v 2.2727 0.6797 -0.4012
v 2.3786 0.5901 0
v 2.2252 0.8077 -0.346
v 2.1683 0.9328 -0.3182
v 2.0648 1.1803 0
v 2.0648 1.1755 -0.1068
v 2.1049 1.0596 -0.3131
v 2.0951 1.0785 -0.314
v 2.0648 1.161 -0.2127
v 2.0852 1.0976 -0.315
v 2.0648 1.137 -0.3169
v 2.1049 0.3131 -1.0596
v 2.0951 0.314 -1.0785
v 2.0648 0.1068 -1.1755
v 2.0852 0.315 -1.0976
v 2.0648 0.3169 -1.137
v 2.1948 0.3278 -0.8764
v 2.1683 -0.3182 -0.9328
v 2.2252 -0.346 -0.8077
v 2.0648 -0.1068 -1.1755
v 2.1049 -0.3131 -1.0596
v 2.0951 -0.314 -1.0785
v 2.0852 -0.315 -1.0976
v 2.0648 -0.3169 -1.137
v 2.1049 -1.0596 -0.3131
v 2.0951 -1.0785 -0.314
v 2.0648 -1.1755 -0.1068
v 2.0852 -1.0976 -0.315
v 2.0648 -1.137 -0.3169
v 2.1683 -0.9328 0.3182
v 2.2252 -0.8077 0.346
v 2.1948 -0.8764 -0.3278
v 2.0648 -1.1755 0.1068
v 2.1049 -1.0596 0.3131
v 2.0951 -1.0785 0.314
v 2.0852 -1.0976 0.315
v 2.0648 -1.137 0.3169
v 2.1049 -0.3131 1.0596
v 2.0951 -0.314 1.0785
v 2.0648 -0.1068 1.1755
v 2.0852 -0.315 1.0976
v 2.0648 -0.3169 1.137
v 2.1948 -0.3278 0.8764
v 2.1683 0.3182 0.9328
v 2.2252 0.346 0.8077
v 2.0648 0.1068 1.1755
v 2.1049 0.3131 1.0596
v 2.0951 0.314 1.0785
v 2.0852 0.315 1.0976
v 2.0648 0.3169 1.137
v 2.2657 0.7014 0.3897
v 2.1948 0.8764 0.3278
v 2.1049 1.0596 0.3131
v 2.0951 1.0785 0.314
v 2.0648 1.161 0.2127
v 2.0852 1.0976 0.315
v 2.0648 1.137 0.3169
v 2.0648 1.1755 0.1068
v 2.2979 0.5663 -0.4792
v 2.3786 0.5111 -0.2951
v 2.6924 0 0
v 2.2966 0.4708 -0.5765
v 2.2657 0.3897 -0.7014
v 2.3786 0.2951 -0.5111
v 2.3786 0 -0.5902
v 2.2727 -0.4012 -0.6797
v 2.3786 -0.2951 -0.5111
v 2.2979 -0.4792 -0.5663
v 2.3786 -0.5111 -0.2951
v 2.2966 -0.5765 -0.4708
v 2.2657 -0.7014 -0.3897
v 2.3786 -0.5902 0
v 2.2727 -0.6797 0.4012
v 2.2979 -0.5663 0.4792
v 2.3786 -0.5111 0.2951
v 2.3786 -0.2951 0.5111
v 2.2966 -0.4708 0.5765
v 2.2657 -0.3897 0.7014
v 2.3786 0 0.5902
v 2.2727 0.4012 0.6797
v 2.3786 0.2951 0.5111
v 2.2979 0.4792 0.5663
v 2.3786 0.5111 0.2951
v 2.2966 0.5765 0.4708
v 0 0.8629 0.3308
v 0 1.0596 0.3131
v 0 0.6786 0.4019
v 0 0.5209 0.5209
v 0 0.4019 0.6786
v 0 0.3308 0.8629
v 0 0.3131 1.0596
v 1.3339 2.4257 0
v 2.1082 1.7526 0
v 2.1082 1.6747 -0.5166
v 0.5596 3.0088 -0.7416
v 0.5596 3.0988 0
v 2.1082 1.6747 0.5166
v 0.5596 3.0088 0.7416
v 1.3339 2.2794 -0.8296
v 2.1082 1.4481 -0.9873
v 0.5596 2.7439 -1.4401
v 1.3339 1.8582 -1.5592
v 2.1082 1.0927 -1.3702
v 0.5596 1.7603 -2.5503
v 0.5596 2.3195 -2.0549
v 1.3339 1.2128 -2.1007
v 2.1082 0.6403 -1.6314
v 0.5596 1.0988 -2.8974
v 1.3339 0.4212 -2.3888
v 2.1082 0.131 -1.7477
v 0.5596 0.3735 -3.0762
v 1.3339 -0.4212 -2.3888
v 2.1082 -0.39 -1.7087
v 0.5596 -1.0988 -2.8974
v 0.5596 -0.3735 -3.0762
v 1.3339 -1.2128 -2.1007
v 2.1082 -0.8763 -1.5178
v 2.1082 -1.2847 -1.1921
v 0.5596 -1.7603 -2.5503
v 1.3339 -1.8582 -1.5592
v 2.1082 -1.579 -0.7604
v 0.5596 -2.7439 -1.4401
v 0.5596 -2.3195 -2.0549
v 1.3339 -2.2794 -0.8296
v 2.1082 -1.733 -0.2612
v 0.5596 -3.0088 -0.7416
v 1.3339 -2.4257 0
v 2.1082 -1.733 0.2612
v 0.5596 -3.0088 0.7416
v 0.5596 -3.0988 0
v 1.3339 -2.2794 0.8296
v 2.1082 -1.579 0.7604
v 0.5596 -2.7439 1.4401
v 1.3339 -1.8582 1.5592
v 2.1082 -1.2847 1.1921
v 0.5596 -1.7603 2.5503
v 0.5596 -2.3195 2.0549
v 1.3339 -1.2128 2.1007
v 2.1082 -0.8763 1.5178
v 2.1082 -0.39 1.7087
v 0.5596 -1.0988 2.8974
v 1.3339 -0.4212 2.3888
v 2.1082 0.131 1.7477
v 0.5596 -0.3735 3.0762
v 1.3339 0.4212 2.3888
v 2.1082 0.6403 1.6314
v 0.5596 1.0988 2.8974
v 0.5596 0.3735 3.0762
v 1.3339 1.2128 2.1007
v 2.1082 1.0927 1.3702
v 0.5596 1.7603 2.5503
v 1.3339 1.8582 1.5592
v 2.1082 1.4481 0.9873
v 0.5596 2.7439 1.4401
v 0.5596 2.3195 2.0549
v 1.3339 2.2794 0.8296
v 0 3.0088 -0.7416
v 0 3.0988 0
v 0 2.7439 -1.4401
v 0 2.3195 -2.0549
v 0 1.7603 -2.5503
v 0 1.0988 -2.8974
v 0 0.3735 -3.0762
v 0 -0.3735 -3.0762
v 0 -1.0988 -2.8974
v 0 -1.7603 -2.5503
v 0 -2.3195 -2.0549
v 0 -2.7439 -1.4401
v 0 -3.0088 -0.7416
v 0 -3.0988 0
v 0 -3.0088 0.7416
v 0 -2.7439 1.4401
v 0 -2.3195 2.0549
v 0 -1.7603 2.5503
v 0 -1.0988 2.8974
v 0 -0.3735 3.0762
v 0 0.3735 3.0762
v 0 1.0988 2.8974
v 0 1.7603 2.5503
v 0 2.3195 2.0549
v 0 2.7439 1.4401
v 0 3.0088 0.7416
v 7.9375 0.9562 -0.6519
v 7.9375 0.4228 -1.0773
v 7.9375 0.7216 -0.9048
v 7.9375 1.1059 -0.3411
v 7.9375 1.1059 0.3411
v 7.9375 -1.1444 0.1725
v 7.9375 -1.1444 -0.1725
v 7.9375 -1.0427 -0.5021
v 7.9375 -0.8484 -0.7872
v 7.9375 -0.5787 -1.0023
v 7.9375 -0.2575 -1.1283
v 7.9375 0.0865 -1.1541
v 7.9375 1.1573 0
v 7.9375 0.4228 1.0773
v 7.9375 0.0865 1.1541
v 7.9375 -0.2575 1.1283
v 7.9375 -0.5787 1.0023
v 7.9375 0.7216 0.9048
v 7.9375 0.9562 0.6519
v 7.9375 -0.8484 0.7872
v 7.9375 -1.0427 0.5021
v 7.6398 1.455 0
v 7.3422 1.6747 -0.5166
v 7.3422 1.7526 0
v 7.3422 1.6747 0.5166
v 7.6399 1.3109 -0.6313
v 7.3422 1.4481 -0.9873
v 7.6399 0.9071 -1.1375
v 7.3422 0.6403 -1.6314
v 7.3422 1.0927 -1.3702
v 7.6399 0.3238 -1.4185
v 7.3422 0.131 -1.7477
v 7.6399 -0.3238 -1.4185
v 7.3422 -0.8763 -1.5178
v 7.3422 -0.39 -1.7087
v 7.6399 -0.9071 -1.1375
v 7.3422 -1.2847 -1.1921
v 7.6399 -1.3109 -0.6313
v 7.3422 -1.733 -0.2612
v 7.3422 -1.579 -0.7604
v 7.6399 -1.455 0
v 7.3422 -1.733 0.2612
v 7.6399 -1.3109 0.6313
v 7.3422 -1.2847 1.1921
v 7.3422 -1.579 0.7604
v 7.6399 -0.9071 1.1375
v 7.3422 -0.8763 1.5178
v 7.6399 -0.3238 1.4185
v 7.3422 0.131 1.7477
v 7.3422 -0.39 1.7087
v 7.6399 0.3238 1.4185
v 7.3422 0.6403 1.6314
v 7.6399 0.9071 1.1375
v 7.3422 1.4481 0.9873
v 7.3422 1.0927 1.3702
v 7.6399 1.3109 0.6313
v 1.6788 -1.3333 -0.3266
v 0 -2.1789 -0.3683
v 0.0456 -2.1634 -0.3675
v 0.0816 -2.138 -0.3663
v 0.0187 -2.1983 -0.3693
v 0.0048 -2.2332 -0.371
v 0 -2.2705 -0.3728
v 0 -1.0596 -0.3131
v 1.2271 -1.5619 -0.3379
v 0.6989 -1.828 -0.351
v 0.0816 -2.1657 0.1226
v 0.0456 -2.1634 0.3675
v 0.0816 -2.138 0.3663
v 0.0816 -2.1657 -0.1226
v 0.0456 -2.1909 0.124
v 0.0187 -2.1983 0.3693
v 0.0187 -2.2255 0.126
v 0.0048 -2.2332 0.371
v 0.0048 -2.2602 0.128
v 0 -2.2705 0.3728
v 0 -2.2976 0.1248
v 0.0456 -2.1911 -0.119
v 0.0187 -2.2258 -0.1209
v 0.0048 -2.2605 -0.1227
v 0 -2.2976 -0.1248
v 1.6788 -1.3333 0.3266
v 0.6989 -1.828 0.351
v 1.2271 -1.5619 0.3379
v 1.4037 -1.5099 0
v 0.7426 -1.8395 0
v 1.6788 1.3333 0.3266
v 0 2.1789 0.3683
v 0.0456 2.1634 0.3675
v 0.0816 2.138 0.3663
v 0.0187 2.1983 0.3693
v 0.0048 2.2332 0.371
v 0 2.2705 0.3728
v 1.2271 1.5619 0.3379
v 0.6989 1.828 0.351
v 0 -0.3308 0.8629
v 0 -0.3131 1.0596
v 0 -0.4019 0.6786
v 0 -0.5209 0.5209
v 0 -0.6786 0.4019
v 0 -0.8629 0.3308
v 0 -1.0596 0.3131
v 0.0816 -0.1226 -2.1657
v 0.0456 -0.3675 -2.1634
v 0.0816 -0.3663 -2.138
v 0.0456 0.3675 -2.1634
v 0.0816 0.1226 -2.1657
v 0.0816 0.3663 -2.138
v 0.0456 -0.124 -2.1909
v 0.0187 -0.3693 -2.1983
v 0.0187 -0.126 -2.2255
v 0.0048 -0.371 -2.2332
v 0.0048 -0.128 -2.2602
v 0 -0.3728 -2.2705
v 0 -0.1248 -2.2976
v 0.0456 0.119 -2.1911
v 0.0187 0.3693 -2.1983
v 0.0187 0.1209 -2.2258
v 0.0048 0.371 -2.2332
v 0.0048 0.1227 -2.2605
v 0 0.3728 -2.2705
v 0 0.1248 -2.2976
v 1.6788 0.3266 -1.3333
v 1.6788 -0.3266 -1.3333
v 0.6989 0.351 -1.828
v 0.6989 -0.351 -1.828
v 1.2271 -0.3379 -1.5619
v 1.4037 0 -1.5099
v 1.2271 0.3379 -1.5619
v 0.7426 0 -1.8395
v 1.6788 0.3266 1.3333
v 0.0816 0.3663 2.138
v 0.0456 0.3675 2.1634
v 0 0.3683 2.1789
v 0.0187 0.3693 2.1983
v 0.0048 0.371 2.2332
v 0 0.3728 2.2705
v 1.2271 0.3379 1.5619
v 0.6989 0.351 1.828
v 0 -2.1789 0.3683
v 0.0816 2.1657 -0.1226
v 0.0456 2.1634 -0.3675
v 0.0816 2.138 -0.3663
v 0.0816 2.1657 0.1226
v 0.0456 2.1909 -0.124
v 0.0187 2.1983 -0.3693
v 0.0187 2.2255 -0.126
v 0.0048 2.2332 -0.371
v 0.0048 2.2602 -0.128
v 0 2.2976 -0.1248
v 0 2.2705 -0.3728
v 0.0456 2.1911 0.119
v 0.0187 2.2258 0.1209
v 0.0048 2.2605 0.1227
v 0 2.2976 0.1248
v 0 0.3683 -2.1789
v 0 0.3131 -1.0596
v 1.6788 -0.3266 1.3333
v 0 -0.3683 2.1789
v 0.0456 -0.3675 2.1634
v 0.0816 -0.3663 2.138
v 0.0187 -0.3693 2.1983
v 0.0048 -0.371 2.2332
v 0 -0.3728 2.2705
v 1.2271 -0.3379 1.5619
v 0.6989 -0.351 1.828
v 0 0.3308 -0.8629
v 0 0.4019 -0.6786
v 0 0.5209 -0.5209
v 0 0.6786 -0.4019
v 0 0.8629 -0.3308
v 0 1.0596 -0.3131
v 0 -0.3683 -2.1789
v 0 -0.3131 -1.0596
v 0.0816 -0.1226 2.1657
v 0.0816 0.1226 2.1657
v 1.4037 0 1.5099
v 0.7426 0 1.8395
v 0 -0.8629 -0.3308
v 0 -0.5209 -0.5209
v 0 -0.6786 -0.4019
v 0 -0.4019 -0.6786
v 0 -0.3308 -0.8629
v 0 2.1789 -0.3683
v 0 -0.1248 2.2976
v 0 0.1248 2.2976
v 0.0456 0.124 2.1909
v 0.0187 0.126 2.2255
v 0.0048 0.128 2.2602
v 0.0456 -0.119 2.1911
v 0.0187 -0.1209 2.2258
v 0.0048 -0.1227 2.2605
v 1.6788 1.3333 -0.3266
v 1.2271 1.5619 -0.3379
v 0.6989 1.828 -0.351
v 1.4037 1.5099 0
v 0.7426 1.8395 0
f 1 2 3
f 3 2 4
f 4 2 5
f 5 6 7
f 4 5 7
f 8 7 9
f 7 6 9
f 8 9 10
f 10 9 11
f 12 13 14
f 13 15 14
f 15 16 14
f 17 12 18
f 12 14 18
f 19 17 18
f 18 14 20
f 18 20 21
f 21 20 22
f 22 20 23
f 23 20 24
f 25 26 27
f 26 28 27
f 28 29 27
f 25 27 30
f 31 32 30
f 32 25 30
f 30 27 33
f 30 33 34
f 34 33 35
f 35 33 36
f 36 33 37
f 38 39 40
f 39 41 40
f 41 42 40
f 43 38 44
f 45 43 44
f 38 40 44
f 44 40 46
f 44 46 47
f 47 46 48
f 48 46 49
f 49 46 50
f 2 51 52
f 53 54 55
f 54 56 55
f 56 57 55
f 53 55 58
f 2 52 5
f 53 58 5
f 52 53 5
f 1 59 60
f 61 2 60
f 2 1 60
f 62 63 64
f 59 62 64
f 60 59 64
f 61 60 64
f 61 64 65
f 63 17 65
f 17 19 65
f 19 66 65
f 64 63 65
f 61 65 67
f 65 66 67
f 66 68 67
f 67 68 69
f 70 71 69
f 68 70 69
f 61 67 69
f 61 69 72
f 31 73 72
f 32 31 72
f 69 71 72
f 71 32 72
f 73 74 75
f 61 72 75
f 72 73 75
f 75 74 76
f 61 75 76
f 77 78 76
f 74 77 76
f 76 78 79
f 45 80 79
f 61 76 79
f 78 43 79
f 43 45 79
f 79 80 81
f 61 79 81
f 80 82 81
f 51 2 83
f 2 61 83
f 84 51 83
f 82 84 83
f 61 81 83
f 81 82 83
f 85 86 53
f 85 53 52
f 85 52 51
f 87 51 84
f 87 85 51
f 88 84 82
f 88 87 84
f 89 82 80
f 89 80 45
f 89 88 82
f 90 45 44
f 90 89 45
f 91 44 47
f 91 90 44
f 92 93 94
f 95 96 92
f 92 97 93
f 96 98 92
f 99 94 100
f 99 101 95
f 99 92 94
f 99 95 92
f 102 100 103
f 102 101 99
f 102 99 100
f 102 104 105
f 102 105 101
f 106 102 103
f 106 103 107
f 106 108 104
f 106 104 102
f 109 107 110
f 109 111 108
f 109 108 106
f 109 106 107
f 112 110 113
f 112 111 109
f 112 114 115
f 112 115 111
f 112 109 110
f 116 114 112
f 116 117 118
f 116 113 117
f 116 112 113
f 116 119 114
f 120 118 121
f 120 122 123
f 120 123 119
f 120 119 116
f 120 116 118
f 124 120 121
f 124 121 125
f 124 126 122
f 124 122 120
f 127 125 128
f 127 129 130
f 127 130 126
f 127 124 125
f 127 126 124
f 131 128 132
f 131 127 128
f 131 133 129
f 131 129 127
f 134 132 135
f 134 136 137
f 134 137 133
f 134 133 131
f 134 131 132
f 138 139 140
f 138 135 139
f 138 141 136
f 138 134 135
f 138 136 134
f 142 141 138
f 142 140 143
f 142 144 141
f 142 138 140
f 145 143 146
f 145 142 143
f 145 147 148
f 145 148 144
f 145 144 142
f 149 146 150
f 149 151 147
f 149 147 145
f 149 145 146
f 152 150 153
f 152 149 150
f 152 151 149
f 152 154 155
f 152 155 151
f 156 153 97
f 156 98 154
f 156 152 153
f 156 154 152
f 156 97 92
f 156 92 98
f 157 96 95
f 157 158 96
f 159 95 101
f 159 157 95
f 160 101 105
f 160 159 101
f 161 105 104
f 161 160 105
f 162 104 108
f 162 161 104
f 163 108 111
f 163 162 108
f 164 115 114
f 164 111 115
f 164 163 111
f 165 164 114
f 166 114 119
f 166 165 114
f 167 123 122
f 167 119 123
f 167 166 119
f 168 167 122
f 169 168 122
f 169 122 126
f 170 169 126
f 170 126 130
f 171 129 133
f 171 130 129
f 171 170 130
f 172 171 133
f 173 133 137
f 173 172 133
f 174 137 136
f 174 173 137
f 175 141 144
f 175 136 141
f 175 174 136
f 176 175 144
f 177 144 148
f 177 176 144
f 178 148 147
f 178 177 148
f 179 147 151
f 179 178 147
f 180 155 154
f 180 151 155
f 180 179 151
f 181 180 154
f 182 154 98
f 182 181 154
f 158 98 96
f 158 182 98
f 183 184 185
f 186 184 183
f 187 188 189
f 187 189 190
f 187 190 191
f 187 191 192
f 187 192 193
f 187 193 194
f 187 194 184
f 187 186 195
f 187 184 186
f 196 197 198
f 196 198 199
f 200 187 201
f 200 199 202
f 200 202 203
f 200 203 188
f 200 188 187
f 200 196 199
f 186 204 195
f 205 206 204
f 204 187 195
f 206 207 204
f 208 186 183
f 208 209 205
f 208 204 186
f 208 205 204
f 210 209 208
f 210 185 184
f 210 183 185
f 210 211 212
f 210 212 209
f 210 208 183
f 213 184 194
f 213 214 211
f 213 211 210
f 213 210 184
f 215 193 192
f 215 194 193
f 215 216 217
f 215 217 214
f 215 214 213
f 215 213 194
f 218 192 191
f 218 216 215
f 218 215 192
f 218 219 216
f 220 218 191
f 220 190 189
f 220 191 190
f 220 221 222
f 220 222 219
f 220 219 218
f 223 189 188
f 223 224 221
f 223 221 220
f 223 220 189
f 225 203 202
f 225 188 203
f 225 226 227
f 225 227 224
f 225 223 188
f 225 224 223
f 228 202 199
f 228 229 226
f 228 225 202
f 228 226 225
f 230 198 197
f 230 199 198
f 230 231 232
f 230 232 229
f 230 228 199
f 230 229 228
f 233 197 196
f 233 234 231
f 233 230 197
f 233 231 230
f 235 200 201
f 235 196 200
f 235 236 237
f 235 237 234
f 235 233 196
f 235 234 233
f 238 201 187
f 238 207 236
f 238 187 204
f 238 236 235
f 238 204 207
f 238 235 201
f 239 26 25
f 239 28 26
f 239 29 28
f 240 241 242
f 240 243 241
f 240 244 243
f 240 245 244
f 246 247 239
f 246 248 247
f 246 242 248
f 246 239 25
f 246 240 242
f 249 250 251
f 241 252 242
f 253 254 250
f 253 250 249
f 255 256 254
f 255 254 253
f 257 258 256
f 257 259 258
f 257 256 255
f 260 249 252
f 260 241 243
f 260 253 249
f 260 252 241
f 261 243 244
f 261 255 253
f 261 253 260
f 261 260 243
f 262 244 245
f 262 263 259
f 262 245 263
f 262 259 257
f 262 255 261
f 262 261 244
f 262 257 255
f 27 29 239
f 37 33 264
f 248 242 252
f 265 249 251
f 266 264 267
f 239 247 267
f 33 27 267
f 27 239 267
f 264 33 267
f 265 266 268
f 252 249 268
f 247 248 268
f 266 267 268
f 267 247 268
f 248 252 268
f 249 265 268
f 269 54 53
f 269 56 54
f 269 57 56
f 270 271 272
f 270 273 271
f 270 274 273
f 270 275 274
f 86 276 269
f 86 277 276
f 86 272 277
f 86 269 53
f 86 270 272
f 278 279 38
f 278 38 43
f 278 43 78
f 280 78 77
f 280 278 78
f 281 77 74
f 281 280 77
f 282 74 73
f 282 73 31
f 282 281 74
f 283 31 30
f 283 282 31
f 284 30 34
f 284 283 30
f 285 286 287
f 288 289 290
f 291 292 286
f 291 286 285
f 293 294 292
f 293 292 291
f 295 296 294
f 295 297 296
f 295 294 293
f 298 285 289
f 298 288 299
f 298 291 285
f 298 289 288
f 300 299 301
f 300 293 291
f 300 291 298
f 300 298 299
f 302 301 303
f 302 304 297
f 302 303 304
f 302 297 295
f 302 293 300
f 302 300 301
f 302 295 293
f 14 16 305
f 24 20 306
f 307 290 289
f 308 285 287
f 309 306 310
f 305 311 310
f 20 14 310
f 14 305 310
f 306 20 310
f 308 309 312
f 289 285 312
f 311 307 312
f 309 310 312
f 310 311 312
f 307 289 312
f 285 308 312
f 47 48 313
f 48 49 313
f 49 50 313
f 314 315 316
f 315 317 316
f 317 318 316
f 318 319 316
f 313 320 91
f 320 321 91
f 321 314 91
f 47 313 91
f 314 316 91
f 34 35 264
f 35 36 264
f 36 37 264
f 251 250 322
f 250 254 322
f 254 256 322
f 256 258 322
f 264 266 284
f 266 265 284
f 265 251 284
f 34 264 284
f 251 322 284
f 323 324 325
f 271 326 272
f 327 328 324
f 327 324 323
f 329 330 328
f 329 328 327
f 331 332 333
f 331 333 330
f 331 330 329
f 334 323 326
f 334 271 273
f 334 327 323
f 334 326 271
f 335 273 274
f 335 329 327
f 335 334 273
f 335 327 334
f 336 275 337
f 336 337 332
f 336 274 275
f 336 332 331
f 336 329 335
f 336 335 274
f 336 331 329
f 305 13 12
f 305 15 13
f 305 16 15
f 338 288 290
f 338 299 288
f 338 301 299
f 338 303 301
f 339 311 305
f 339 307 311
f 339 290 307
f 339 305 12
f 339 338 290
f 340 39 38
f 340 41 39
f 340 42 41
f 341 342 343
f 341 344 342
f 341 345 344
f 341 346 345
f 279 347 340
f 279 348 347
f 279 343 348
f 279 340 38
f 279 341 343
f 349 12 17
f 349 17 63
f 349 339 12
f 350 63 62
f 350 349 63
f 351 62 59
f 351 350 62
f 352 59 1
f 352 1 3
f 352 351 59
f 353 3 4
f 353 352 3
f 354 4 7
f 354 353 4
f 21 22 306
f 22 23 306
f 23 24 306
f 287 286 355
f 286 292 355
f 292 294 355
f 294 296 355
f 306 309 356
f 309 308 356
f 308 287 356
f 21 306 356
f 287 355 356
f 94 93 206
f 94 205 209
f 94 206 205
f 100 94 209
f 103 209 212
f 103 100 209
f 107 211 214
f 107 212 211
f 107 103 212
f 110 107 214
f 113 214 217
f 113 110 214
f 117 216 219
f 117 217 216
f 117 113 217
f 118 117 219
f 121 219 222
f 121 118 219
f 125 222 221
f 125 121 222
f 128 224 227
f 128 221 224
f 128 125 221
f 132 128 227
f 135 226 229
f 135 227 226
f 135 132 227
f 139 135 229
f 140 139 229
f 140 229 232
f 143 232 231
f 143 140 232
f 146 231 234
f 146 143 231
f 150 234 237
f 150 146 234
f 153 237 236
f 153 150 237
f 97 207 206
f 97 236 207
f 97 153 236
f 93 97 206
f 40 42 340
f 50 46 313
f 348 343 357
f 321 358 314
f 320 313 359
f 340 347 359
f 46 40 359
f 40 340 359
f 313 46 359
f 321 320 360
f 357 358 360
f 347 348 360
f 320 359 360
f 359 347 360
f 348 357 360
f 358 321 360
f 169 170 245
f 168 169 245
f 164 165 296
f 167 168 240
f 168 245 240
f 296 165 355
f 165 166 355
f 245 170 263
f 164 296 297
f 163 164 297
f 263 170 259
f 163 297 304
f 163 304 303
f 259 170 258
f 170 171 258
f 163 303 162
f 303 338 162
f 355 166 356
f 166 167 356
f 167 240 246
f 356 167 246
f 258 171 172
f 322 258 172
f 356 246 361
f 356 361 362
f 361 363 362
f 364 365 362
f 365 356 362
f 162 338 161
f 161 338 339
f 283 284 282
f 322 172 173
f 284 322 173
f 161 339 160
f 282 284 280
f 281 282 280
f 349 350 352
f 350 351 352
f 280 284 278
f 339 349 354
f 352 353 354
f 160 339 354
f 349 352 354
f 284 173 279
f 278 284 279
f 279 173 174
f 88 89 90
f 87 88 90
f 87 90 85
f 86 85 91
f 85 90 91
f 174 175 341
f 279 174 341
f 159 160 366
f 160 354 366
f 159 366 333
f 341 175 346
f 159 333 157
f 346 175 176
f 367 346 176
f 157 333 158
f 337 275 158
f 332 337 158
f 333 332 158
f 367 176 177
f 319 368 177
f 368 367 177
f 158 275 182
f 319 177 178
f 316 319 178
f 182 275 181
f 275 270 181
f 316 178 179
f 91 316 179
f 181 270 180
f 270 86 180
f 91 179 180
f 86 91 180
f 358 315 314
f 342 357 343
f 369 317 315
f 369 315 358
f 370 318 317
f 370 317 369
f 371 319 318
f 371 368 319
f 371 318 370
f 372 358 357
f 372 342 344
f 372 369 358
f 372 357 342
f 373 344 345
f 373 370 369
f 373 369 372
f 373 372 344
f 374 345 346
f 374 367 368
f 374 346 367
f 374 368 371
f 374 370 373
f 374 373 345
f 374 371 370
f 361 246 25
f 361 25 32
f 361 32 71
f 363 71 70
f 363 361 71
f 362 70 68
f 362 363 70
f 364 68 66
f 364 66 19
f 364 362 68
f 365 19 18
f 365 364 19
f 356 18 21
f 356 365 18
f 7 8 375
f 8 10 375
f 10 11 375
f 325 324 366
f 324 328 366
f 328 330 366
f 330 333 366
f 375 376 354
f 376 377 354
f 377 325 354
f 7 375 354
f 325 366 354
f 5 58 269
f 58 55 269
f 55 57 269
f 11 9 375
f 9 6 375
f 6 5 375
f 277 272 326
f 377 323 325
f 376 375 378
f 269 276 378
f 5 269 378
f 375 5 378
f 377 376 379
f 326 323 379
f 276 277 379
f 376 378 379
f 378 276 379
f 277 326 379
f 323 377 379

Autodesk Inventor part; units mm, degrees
ref_plane "YZ Plane" through (0, 0, 0) normal (1, 0, 0) x (0, 1, 0)
ref_plane "XZ Plane" through (0, 0, 0) normal (0, 1, 0) x (-1, 0, 0)
sketch "Sketch1" plane through (0, 0, 0) normal (0, 0, 1) x (1, 0, 0)
  line L0 (2.6924, 0) -> (7.9375, 0)
  line L1 (7.9375, 0) -> (7.9375, 1.7526)
  line L2 (7.9375, 1.7526) -> (2.1082, 1.7526)
  line L3 (0.5596, 3.0988) -> (0, 3.0988)
  line L4 (-1.5875, 0) -> (9.525, 0) projected
  line L5 (0, -0.6198) -> (0, 3.7186) projected
  line L6 (0, 2.2098) -> (2.0648, 1.1803)
  line L7 (2.0648, 1.1803) -> (2.6924, 0)
  line L8 (2.1082, 1.7526) -> (0.5596, 3.0988)
  line L9 (0, 3.0988) -> (0, 2.2098)
  dimension "d2" = 3.5052
  dimension "d3" = 6.1976
  dimension "d4" = 2.6924
  dimension "d5" = 4.4196
  dimension "d6" = 26.5
  dimension "d7" = 62
  dimension "d13" = 41
  dimension "d14" = 2.1082
  dimension "d15" = 7.9375
revolve "Body" add sketch "Sketch1" angle 360 about axis through (2.6924, 0, 0) along (1, 0, 0) contours L7 L6 L5 L3 L8 L2 L1 L0
sketch "Sketch2" plane through (0, 0, 0) normal (-1, 0, 0) x (0, 0, 1)
  line L0 (0, -4.3383) -> (0, 4.3383) projected
  line L1 (-4.3383, 0) -> (4.3383, 0) projected
  line L2 (0, 2.2098) -> (0, 0) construction
  line L3 (0, 0) -> (2.2098, 0) construction
  arc A0 (0.7366, 0) -> (0, 0.7366) centre (0, 0) ccw
  line L4 (0, 0) -> (0.7947, 0.7947) construction
  arc A1 (1.1049, 0) -> (0, 1.1049) centre (0, 0) ccw construction
  line L5 (0.3683, 2.1789) -> (0.3131, 1.0596)
  line L6 (2.1789, 0.3683) -> (1.0596, 0.3131)
  arc A2 (0.3131, 1.0596) -> (1.0596, 0.3131) centre (1.0245, 1.0245) ccw
  arc A3 (2.2098, 0) -> (2.1789, 0.3683) centre (0, 0) ccw
  arc A4 (0.3683, 2.1789) -> (0, 2.2098) centre (0, 0) ccw
  arc A5 (2.1789, 0.3683) -> (0.3683, 2.1789) centre (0, 0) ccw
  line L7 (0.3683, -2.1789) -> (0.3131, -1.0596)
  line L8 (2.1789, -0.3683) -> (1.0596, -0.3131)
  arc A6 (1.0596, -0.3131) -> (0.3131, -1.0596) centre (1.0245, -1.0245) ccw
  arc A7 (2.1789, -0.3683) -> (2.2098, 0) centre (0, 0) ccw
  arc A8 (0, -2.2098) -> (0.3683, -2.1789) centre (0, 0) ccw
  arc A9 (0.3683, -2.1789) -> (2.1789, -0.3683) centre (0, 0) ccw
  line L9 (-0.3683, 2.1789) -> (-0.3131, 1.0596)
  line L10 (-2.1789, 0.3683) -> (-1.0596, 0.3131)
  arc A10 (-1.0596, 0.3131) -> (-0.3131, 1.0596) centre (-1.0245, 1.0245) ccw
  arc A11 (-2.1789, 0.3683) -> (-2.2098, 0) centre (0, 0) ccw
  arc A12 (0, 2.2098) -> (-0.3683, 2.1789) centre (0, 0) ccw
  arc A13 (-0.3683, 2.1789) -> (-2.1789, 0.3683) centre (0, 0) ccw
  arc A14 (-2.1789, -0.3683) -> (-0.3683, -2.1789) centre (0, 0) ccw
  arc A15 (-0.3683, -2.1789) -> (0, -2.2098) centre (0, 0) ccw
  arc A16 (-2.2098, 0) -> (-2.1789, -0.3683) centre (0, 0) ccw
  line L11 (-2.1789, -0.3683) -> (-1.0596, -0.3131)
  arc A17 (-0.3131, -1.0596) -> (-1.0596, -0.3131) centre (-1.0245, -1.0245) ccw
  line L12 (-0.3683, -2.1789) -> (-0.3131, -1.0596)
  dimension "d18" = 45
  dimension "d19" = 1.4732
  dimension "d20" = 2.2098
  dimension "d21" = 4.4196
  dimension "d22" = 0.3683
extrude "Slot" add sketch "Sketch2" against normal up to next contours A2 L5 A5 L6 | L9 A10 L10 A13 | L7 A6 L8 A9 | A14 L11 A17 L12
fillet "Fillet1" radius 0.1473 4 edges at (0, 2.2098, 0) (0, 0, 2.2098) (0, -2.2098, 0) (0, 0, -2.2098)
thread "Thread" size "6-32 UNC" class "2A" standard "ANSI Unified Screw Threads" length 3.8449
chamfer "Chamfer1" distance 0.5953 distance2 0.5953 1 edges at (7.9375, -1.7526, 0) measured on face at (7.9375, -0.6726, -0.7284)
ref_plane "Work Plane2" through (2.032, 0, 0) normal (0, 1, 0) x (1, 0, 0)
equation "\"d2\" = GD"
equation "\"d3\" = KOD"
equation "\"d4\" = INTI"
equation "\"d5\" = SDM"
equation "\"d13\" = 0.5 * SEWI"
equation "\"d14\" = KOH"
equation "\"d15\" = NLG"
equation "\"d19\" = 0.333333 * SDM"
equation "\"d20\" = 0.5 * SDM"
equation "\"d21\" = SDM"
equation "\"d22\" = 0.5 * SBR"
equation "\"d45\" = INTI"
equation "\"d25\" = 0.2 * SBR"
equation "\"d9\" = GEL"
equation "\"d11\" = -0.5 * SPD + 0.5 * GD"
equation "\"d12\" = GUL"
equation "\"GD\" = NND"
equation "\"NLG\" = 7.9375"
equation "\"GEL\" = 3.84492"
equation "\"KOD\" = 6.1976"
equation "\"KOH\" = 2.1082"
equation "\"SDM\" = 4.4196"
equation "\"INTI\" = 2.6924"
equation "\"SBR\" = 0.7366"
equation "\"GUL\" = 0.75 * GAL"
equation "\"SPD\" = 2.31458"
equation "\"SEWI\" = 82deg"
equation "\"d0\" = NLG"
equation "\"d1\" = KOH"
equation "\"d17\" = SDM"
equation "\"TOA\" = 30deg"
equation "\"THREADDIA\" = 3.5052"
equation "\"BDM\" = NND"
equation "\"NND\" = 3.5052"
equation "\"GAL\" = 0.79375"
equation "\"GD1\" = SPD"
properties part number "ANSI B18.6.3 - 6-32 x 5/16, CRFCHMSTII(5)" material "Steel, Mild"
